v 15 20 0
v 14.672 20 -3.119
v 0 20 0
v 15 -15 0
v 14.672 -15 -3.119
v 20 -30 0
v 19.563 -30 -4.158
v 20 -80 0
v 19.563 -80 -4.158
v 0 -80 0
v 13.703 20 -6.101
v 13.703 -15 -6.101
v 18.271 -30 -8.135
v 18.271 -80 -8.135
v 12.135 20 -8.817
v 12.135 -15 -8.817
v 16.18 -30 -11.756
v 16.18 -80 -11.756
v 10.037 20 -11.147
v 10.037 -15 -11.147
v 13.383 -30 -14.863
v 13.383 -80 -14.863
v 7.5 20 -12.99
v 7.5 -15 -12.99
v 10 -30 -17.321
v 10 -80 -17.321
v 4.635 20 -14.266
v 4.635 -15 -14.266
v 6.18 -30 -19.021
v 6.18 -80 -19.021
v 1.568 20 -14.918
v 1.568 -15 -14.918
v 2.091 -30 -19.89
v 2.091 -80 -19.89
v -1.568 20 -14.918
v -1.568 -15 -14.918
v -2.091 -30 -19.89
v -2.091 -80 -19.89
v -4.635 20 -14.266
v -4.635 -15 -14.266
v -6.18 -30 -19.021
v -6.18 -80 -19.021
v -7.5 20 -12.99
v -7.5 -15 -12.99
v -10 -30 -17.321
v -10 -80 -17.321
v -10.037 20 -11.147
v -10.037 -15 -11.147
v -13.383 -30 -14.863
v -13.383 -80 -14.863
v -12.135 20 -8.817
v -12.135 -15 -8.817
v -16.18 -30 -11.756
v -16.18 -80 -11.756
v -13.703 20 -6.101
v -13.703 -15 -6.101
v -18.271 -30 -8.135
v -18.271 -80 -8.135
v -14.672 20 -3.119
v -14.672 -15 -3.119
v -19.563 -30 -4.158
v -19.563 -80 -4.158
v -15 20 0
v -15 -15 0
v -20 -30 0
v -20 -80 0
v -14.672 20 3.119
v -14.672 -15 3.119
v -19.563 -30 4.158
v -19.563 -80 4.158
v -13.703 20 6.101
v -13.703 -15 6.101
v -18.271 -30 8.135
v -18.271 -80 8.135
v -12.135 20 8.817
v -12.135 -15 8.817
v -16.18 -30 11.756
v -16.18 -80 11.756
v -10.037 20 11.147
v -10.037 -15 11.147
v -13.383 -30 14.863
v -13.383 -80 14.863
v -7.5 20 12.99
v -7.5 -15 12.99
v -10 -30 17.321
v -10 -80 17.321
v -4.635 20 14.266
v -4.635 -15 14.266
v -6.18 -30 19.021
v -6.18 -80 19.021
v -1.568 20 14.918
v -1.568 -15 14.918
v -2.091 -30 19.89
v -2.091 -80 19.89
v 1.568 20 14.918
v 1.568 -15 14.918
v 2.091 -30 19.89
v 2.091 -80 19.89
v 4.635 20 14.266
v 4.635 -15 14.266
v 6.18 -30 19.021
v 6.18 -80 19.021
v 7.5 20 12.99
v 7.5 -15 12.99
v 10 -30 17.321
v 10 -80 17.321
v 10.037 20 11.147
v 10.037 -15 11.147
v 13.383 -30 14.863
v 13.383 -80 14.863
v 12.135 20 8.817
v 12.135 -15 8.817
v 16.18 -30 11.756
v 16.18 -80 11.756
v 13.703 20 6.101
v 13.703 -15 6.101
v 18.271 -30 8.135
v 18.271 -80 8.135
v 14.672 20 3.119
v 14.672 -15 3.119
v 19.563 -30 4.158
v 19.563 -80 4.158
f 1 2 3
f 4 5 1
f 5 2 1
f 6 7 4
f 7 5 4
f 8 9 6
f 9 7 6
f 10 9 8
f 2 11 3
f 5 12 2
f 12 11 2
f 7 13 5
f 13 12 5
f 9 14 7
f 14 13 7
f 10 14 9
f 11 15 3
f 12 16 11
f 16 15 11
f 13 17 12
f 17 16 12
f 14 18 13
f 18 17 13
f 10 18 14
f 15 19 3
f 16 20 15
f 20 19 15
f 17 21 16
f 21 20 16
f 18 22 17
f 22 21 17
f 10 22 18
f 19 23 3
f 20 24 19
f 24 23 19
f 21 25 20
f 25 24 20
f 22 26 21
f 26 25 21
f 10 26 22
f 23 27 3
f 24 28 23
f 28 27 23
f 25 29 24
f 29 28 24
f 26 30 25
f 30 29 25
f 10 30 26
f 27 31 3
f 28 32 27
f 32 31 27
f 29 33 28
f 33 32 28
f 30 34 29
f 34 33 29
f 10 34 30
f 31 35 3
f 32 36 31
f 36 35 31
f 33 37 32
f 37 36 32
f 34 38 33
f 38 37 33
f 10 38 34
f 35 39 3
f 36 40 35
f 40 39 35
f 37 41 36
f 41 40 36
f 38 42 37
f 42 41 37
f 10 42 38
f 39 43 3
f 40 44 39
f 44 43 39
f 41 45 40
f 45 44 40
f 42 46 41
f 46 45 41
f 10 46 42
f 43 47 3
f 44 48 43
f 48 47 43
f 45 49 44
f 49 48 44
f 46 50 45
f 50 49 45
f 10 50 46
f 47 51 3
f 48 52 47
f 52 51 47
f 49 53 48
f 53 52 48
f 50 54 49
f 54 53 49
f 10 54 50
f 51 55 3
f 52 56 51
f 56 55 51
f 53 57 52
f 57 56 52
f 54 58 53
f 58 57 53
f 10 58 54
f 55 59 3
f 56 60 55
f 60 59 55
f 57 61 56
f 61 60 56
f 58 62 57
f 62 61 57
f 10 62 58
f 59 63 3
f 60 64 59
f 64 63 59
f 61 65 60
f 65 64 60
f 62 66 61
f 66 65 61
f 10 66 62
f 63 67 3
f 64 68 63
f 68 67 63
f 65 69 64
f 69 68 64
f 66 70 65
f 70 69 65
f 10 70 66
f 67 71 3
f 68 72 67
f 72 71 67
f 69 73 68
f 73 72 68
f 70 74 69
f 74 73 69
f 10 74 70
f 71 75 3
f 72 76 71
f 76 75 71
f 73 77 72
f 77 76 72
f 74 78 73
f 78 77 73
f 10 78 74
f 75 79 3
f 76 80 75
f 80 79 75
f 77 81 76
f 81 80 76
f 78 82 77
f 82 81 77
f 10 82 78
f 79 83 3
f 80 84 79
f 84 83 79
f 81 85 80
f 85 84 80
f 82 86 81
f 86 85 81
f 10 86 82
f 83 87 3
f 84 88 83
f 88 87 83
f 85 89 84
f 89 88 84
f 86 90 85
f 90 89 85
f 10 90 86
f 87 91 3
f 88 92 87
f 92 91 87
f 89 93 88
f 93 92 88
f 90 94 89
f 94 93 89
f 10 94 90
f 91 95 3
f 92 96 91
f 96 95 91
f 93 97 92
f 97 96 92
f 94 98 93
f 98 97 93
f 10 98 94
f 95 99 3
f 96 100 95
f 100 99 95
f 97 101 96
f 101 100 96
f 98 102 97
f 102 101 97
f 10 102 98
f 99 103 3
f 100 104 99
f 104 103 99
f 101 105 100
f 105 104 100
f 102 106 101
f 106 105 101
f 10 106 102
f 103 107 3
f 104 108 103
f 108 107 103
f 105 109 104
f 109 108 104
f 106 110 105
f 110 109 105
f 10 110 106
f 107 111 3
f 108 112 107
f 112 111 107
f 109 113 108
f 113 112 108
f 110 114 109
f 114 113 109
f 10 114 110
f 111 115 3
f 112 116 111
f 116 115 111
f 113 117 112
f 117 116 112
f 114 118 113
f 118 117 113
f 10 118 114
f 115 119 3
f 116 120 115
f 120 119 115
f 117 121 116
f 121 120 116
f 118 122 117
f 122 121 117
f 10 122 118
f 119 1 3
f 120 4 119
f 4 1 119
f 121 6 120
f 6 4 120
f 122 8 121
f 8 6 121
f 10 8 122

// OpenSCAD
module Shaft_01(){

    color("gray")
    // translate([-1,0,-1])
    
    rotate([90,0,0])
    rotate_extrude(angle = 360)
    rotate([0,0,90])

    polygon(points=[[-20,0],[80,0],[80,20],[30,20],[15,15],[-20,15]]);

}
 
Shaft_01();

// Written by Nicolì Angelo (Gengio) 2024: 
// MIT License

//Permission is hereby granted, free of charge, to any person obtaining a copy of this software and associated documentation files (the "Software"), to deal in the Software without restriction, including without limitation the rights to use, copy, modify, merge, publish, distribute, sublicense, and/or sell copies of the Software, and to permit persons to whom the Software is furnished to do so, subject to the following conditions:

//The above copyright notice and this permission notice shall be included in all copies or substantial portions of the Software.

//THE SOFTWARE IS PROVIDED "AS IS", WITHOUT WARRANTY OF ANY KIND, EXPRESS OR IMPLIED, INCLUDING BUT NOT LIMITED TO THE WARRANTIES OF MERCHANTABILITY, FITNESS FOR A PARTICULAR PURPOSE AND NONINFRINGEMENT. IN NO EVENT SHALL THE AUTHORS OR COPYRIGHT HOLDERS BE LIABLE FOR ANY CLAIM, DAMAGES OR OTHER LIABILITY, WHETHER IN AN ACTION OF CONTRACT, TORT OR OTHERWISE, ARISING FROM, OUT OF OR IN CONNECTION WITH THE SOFTWARE OR THE USE OR OTHER DEALINGS IN THE SOFTWARE.
